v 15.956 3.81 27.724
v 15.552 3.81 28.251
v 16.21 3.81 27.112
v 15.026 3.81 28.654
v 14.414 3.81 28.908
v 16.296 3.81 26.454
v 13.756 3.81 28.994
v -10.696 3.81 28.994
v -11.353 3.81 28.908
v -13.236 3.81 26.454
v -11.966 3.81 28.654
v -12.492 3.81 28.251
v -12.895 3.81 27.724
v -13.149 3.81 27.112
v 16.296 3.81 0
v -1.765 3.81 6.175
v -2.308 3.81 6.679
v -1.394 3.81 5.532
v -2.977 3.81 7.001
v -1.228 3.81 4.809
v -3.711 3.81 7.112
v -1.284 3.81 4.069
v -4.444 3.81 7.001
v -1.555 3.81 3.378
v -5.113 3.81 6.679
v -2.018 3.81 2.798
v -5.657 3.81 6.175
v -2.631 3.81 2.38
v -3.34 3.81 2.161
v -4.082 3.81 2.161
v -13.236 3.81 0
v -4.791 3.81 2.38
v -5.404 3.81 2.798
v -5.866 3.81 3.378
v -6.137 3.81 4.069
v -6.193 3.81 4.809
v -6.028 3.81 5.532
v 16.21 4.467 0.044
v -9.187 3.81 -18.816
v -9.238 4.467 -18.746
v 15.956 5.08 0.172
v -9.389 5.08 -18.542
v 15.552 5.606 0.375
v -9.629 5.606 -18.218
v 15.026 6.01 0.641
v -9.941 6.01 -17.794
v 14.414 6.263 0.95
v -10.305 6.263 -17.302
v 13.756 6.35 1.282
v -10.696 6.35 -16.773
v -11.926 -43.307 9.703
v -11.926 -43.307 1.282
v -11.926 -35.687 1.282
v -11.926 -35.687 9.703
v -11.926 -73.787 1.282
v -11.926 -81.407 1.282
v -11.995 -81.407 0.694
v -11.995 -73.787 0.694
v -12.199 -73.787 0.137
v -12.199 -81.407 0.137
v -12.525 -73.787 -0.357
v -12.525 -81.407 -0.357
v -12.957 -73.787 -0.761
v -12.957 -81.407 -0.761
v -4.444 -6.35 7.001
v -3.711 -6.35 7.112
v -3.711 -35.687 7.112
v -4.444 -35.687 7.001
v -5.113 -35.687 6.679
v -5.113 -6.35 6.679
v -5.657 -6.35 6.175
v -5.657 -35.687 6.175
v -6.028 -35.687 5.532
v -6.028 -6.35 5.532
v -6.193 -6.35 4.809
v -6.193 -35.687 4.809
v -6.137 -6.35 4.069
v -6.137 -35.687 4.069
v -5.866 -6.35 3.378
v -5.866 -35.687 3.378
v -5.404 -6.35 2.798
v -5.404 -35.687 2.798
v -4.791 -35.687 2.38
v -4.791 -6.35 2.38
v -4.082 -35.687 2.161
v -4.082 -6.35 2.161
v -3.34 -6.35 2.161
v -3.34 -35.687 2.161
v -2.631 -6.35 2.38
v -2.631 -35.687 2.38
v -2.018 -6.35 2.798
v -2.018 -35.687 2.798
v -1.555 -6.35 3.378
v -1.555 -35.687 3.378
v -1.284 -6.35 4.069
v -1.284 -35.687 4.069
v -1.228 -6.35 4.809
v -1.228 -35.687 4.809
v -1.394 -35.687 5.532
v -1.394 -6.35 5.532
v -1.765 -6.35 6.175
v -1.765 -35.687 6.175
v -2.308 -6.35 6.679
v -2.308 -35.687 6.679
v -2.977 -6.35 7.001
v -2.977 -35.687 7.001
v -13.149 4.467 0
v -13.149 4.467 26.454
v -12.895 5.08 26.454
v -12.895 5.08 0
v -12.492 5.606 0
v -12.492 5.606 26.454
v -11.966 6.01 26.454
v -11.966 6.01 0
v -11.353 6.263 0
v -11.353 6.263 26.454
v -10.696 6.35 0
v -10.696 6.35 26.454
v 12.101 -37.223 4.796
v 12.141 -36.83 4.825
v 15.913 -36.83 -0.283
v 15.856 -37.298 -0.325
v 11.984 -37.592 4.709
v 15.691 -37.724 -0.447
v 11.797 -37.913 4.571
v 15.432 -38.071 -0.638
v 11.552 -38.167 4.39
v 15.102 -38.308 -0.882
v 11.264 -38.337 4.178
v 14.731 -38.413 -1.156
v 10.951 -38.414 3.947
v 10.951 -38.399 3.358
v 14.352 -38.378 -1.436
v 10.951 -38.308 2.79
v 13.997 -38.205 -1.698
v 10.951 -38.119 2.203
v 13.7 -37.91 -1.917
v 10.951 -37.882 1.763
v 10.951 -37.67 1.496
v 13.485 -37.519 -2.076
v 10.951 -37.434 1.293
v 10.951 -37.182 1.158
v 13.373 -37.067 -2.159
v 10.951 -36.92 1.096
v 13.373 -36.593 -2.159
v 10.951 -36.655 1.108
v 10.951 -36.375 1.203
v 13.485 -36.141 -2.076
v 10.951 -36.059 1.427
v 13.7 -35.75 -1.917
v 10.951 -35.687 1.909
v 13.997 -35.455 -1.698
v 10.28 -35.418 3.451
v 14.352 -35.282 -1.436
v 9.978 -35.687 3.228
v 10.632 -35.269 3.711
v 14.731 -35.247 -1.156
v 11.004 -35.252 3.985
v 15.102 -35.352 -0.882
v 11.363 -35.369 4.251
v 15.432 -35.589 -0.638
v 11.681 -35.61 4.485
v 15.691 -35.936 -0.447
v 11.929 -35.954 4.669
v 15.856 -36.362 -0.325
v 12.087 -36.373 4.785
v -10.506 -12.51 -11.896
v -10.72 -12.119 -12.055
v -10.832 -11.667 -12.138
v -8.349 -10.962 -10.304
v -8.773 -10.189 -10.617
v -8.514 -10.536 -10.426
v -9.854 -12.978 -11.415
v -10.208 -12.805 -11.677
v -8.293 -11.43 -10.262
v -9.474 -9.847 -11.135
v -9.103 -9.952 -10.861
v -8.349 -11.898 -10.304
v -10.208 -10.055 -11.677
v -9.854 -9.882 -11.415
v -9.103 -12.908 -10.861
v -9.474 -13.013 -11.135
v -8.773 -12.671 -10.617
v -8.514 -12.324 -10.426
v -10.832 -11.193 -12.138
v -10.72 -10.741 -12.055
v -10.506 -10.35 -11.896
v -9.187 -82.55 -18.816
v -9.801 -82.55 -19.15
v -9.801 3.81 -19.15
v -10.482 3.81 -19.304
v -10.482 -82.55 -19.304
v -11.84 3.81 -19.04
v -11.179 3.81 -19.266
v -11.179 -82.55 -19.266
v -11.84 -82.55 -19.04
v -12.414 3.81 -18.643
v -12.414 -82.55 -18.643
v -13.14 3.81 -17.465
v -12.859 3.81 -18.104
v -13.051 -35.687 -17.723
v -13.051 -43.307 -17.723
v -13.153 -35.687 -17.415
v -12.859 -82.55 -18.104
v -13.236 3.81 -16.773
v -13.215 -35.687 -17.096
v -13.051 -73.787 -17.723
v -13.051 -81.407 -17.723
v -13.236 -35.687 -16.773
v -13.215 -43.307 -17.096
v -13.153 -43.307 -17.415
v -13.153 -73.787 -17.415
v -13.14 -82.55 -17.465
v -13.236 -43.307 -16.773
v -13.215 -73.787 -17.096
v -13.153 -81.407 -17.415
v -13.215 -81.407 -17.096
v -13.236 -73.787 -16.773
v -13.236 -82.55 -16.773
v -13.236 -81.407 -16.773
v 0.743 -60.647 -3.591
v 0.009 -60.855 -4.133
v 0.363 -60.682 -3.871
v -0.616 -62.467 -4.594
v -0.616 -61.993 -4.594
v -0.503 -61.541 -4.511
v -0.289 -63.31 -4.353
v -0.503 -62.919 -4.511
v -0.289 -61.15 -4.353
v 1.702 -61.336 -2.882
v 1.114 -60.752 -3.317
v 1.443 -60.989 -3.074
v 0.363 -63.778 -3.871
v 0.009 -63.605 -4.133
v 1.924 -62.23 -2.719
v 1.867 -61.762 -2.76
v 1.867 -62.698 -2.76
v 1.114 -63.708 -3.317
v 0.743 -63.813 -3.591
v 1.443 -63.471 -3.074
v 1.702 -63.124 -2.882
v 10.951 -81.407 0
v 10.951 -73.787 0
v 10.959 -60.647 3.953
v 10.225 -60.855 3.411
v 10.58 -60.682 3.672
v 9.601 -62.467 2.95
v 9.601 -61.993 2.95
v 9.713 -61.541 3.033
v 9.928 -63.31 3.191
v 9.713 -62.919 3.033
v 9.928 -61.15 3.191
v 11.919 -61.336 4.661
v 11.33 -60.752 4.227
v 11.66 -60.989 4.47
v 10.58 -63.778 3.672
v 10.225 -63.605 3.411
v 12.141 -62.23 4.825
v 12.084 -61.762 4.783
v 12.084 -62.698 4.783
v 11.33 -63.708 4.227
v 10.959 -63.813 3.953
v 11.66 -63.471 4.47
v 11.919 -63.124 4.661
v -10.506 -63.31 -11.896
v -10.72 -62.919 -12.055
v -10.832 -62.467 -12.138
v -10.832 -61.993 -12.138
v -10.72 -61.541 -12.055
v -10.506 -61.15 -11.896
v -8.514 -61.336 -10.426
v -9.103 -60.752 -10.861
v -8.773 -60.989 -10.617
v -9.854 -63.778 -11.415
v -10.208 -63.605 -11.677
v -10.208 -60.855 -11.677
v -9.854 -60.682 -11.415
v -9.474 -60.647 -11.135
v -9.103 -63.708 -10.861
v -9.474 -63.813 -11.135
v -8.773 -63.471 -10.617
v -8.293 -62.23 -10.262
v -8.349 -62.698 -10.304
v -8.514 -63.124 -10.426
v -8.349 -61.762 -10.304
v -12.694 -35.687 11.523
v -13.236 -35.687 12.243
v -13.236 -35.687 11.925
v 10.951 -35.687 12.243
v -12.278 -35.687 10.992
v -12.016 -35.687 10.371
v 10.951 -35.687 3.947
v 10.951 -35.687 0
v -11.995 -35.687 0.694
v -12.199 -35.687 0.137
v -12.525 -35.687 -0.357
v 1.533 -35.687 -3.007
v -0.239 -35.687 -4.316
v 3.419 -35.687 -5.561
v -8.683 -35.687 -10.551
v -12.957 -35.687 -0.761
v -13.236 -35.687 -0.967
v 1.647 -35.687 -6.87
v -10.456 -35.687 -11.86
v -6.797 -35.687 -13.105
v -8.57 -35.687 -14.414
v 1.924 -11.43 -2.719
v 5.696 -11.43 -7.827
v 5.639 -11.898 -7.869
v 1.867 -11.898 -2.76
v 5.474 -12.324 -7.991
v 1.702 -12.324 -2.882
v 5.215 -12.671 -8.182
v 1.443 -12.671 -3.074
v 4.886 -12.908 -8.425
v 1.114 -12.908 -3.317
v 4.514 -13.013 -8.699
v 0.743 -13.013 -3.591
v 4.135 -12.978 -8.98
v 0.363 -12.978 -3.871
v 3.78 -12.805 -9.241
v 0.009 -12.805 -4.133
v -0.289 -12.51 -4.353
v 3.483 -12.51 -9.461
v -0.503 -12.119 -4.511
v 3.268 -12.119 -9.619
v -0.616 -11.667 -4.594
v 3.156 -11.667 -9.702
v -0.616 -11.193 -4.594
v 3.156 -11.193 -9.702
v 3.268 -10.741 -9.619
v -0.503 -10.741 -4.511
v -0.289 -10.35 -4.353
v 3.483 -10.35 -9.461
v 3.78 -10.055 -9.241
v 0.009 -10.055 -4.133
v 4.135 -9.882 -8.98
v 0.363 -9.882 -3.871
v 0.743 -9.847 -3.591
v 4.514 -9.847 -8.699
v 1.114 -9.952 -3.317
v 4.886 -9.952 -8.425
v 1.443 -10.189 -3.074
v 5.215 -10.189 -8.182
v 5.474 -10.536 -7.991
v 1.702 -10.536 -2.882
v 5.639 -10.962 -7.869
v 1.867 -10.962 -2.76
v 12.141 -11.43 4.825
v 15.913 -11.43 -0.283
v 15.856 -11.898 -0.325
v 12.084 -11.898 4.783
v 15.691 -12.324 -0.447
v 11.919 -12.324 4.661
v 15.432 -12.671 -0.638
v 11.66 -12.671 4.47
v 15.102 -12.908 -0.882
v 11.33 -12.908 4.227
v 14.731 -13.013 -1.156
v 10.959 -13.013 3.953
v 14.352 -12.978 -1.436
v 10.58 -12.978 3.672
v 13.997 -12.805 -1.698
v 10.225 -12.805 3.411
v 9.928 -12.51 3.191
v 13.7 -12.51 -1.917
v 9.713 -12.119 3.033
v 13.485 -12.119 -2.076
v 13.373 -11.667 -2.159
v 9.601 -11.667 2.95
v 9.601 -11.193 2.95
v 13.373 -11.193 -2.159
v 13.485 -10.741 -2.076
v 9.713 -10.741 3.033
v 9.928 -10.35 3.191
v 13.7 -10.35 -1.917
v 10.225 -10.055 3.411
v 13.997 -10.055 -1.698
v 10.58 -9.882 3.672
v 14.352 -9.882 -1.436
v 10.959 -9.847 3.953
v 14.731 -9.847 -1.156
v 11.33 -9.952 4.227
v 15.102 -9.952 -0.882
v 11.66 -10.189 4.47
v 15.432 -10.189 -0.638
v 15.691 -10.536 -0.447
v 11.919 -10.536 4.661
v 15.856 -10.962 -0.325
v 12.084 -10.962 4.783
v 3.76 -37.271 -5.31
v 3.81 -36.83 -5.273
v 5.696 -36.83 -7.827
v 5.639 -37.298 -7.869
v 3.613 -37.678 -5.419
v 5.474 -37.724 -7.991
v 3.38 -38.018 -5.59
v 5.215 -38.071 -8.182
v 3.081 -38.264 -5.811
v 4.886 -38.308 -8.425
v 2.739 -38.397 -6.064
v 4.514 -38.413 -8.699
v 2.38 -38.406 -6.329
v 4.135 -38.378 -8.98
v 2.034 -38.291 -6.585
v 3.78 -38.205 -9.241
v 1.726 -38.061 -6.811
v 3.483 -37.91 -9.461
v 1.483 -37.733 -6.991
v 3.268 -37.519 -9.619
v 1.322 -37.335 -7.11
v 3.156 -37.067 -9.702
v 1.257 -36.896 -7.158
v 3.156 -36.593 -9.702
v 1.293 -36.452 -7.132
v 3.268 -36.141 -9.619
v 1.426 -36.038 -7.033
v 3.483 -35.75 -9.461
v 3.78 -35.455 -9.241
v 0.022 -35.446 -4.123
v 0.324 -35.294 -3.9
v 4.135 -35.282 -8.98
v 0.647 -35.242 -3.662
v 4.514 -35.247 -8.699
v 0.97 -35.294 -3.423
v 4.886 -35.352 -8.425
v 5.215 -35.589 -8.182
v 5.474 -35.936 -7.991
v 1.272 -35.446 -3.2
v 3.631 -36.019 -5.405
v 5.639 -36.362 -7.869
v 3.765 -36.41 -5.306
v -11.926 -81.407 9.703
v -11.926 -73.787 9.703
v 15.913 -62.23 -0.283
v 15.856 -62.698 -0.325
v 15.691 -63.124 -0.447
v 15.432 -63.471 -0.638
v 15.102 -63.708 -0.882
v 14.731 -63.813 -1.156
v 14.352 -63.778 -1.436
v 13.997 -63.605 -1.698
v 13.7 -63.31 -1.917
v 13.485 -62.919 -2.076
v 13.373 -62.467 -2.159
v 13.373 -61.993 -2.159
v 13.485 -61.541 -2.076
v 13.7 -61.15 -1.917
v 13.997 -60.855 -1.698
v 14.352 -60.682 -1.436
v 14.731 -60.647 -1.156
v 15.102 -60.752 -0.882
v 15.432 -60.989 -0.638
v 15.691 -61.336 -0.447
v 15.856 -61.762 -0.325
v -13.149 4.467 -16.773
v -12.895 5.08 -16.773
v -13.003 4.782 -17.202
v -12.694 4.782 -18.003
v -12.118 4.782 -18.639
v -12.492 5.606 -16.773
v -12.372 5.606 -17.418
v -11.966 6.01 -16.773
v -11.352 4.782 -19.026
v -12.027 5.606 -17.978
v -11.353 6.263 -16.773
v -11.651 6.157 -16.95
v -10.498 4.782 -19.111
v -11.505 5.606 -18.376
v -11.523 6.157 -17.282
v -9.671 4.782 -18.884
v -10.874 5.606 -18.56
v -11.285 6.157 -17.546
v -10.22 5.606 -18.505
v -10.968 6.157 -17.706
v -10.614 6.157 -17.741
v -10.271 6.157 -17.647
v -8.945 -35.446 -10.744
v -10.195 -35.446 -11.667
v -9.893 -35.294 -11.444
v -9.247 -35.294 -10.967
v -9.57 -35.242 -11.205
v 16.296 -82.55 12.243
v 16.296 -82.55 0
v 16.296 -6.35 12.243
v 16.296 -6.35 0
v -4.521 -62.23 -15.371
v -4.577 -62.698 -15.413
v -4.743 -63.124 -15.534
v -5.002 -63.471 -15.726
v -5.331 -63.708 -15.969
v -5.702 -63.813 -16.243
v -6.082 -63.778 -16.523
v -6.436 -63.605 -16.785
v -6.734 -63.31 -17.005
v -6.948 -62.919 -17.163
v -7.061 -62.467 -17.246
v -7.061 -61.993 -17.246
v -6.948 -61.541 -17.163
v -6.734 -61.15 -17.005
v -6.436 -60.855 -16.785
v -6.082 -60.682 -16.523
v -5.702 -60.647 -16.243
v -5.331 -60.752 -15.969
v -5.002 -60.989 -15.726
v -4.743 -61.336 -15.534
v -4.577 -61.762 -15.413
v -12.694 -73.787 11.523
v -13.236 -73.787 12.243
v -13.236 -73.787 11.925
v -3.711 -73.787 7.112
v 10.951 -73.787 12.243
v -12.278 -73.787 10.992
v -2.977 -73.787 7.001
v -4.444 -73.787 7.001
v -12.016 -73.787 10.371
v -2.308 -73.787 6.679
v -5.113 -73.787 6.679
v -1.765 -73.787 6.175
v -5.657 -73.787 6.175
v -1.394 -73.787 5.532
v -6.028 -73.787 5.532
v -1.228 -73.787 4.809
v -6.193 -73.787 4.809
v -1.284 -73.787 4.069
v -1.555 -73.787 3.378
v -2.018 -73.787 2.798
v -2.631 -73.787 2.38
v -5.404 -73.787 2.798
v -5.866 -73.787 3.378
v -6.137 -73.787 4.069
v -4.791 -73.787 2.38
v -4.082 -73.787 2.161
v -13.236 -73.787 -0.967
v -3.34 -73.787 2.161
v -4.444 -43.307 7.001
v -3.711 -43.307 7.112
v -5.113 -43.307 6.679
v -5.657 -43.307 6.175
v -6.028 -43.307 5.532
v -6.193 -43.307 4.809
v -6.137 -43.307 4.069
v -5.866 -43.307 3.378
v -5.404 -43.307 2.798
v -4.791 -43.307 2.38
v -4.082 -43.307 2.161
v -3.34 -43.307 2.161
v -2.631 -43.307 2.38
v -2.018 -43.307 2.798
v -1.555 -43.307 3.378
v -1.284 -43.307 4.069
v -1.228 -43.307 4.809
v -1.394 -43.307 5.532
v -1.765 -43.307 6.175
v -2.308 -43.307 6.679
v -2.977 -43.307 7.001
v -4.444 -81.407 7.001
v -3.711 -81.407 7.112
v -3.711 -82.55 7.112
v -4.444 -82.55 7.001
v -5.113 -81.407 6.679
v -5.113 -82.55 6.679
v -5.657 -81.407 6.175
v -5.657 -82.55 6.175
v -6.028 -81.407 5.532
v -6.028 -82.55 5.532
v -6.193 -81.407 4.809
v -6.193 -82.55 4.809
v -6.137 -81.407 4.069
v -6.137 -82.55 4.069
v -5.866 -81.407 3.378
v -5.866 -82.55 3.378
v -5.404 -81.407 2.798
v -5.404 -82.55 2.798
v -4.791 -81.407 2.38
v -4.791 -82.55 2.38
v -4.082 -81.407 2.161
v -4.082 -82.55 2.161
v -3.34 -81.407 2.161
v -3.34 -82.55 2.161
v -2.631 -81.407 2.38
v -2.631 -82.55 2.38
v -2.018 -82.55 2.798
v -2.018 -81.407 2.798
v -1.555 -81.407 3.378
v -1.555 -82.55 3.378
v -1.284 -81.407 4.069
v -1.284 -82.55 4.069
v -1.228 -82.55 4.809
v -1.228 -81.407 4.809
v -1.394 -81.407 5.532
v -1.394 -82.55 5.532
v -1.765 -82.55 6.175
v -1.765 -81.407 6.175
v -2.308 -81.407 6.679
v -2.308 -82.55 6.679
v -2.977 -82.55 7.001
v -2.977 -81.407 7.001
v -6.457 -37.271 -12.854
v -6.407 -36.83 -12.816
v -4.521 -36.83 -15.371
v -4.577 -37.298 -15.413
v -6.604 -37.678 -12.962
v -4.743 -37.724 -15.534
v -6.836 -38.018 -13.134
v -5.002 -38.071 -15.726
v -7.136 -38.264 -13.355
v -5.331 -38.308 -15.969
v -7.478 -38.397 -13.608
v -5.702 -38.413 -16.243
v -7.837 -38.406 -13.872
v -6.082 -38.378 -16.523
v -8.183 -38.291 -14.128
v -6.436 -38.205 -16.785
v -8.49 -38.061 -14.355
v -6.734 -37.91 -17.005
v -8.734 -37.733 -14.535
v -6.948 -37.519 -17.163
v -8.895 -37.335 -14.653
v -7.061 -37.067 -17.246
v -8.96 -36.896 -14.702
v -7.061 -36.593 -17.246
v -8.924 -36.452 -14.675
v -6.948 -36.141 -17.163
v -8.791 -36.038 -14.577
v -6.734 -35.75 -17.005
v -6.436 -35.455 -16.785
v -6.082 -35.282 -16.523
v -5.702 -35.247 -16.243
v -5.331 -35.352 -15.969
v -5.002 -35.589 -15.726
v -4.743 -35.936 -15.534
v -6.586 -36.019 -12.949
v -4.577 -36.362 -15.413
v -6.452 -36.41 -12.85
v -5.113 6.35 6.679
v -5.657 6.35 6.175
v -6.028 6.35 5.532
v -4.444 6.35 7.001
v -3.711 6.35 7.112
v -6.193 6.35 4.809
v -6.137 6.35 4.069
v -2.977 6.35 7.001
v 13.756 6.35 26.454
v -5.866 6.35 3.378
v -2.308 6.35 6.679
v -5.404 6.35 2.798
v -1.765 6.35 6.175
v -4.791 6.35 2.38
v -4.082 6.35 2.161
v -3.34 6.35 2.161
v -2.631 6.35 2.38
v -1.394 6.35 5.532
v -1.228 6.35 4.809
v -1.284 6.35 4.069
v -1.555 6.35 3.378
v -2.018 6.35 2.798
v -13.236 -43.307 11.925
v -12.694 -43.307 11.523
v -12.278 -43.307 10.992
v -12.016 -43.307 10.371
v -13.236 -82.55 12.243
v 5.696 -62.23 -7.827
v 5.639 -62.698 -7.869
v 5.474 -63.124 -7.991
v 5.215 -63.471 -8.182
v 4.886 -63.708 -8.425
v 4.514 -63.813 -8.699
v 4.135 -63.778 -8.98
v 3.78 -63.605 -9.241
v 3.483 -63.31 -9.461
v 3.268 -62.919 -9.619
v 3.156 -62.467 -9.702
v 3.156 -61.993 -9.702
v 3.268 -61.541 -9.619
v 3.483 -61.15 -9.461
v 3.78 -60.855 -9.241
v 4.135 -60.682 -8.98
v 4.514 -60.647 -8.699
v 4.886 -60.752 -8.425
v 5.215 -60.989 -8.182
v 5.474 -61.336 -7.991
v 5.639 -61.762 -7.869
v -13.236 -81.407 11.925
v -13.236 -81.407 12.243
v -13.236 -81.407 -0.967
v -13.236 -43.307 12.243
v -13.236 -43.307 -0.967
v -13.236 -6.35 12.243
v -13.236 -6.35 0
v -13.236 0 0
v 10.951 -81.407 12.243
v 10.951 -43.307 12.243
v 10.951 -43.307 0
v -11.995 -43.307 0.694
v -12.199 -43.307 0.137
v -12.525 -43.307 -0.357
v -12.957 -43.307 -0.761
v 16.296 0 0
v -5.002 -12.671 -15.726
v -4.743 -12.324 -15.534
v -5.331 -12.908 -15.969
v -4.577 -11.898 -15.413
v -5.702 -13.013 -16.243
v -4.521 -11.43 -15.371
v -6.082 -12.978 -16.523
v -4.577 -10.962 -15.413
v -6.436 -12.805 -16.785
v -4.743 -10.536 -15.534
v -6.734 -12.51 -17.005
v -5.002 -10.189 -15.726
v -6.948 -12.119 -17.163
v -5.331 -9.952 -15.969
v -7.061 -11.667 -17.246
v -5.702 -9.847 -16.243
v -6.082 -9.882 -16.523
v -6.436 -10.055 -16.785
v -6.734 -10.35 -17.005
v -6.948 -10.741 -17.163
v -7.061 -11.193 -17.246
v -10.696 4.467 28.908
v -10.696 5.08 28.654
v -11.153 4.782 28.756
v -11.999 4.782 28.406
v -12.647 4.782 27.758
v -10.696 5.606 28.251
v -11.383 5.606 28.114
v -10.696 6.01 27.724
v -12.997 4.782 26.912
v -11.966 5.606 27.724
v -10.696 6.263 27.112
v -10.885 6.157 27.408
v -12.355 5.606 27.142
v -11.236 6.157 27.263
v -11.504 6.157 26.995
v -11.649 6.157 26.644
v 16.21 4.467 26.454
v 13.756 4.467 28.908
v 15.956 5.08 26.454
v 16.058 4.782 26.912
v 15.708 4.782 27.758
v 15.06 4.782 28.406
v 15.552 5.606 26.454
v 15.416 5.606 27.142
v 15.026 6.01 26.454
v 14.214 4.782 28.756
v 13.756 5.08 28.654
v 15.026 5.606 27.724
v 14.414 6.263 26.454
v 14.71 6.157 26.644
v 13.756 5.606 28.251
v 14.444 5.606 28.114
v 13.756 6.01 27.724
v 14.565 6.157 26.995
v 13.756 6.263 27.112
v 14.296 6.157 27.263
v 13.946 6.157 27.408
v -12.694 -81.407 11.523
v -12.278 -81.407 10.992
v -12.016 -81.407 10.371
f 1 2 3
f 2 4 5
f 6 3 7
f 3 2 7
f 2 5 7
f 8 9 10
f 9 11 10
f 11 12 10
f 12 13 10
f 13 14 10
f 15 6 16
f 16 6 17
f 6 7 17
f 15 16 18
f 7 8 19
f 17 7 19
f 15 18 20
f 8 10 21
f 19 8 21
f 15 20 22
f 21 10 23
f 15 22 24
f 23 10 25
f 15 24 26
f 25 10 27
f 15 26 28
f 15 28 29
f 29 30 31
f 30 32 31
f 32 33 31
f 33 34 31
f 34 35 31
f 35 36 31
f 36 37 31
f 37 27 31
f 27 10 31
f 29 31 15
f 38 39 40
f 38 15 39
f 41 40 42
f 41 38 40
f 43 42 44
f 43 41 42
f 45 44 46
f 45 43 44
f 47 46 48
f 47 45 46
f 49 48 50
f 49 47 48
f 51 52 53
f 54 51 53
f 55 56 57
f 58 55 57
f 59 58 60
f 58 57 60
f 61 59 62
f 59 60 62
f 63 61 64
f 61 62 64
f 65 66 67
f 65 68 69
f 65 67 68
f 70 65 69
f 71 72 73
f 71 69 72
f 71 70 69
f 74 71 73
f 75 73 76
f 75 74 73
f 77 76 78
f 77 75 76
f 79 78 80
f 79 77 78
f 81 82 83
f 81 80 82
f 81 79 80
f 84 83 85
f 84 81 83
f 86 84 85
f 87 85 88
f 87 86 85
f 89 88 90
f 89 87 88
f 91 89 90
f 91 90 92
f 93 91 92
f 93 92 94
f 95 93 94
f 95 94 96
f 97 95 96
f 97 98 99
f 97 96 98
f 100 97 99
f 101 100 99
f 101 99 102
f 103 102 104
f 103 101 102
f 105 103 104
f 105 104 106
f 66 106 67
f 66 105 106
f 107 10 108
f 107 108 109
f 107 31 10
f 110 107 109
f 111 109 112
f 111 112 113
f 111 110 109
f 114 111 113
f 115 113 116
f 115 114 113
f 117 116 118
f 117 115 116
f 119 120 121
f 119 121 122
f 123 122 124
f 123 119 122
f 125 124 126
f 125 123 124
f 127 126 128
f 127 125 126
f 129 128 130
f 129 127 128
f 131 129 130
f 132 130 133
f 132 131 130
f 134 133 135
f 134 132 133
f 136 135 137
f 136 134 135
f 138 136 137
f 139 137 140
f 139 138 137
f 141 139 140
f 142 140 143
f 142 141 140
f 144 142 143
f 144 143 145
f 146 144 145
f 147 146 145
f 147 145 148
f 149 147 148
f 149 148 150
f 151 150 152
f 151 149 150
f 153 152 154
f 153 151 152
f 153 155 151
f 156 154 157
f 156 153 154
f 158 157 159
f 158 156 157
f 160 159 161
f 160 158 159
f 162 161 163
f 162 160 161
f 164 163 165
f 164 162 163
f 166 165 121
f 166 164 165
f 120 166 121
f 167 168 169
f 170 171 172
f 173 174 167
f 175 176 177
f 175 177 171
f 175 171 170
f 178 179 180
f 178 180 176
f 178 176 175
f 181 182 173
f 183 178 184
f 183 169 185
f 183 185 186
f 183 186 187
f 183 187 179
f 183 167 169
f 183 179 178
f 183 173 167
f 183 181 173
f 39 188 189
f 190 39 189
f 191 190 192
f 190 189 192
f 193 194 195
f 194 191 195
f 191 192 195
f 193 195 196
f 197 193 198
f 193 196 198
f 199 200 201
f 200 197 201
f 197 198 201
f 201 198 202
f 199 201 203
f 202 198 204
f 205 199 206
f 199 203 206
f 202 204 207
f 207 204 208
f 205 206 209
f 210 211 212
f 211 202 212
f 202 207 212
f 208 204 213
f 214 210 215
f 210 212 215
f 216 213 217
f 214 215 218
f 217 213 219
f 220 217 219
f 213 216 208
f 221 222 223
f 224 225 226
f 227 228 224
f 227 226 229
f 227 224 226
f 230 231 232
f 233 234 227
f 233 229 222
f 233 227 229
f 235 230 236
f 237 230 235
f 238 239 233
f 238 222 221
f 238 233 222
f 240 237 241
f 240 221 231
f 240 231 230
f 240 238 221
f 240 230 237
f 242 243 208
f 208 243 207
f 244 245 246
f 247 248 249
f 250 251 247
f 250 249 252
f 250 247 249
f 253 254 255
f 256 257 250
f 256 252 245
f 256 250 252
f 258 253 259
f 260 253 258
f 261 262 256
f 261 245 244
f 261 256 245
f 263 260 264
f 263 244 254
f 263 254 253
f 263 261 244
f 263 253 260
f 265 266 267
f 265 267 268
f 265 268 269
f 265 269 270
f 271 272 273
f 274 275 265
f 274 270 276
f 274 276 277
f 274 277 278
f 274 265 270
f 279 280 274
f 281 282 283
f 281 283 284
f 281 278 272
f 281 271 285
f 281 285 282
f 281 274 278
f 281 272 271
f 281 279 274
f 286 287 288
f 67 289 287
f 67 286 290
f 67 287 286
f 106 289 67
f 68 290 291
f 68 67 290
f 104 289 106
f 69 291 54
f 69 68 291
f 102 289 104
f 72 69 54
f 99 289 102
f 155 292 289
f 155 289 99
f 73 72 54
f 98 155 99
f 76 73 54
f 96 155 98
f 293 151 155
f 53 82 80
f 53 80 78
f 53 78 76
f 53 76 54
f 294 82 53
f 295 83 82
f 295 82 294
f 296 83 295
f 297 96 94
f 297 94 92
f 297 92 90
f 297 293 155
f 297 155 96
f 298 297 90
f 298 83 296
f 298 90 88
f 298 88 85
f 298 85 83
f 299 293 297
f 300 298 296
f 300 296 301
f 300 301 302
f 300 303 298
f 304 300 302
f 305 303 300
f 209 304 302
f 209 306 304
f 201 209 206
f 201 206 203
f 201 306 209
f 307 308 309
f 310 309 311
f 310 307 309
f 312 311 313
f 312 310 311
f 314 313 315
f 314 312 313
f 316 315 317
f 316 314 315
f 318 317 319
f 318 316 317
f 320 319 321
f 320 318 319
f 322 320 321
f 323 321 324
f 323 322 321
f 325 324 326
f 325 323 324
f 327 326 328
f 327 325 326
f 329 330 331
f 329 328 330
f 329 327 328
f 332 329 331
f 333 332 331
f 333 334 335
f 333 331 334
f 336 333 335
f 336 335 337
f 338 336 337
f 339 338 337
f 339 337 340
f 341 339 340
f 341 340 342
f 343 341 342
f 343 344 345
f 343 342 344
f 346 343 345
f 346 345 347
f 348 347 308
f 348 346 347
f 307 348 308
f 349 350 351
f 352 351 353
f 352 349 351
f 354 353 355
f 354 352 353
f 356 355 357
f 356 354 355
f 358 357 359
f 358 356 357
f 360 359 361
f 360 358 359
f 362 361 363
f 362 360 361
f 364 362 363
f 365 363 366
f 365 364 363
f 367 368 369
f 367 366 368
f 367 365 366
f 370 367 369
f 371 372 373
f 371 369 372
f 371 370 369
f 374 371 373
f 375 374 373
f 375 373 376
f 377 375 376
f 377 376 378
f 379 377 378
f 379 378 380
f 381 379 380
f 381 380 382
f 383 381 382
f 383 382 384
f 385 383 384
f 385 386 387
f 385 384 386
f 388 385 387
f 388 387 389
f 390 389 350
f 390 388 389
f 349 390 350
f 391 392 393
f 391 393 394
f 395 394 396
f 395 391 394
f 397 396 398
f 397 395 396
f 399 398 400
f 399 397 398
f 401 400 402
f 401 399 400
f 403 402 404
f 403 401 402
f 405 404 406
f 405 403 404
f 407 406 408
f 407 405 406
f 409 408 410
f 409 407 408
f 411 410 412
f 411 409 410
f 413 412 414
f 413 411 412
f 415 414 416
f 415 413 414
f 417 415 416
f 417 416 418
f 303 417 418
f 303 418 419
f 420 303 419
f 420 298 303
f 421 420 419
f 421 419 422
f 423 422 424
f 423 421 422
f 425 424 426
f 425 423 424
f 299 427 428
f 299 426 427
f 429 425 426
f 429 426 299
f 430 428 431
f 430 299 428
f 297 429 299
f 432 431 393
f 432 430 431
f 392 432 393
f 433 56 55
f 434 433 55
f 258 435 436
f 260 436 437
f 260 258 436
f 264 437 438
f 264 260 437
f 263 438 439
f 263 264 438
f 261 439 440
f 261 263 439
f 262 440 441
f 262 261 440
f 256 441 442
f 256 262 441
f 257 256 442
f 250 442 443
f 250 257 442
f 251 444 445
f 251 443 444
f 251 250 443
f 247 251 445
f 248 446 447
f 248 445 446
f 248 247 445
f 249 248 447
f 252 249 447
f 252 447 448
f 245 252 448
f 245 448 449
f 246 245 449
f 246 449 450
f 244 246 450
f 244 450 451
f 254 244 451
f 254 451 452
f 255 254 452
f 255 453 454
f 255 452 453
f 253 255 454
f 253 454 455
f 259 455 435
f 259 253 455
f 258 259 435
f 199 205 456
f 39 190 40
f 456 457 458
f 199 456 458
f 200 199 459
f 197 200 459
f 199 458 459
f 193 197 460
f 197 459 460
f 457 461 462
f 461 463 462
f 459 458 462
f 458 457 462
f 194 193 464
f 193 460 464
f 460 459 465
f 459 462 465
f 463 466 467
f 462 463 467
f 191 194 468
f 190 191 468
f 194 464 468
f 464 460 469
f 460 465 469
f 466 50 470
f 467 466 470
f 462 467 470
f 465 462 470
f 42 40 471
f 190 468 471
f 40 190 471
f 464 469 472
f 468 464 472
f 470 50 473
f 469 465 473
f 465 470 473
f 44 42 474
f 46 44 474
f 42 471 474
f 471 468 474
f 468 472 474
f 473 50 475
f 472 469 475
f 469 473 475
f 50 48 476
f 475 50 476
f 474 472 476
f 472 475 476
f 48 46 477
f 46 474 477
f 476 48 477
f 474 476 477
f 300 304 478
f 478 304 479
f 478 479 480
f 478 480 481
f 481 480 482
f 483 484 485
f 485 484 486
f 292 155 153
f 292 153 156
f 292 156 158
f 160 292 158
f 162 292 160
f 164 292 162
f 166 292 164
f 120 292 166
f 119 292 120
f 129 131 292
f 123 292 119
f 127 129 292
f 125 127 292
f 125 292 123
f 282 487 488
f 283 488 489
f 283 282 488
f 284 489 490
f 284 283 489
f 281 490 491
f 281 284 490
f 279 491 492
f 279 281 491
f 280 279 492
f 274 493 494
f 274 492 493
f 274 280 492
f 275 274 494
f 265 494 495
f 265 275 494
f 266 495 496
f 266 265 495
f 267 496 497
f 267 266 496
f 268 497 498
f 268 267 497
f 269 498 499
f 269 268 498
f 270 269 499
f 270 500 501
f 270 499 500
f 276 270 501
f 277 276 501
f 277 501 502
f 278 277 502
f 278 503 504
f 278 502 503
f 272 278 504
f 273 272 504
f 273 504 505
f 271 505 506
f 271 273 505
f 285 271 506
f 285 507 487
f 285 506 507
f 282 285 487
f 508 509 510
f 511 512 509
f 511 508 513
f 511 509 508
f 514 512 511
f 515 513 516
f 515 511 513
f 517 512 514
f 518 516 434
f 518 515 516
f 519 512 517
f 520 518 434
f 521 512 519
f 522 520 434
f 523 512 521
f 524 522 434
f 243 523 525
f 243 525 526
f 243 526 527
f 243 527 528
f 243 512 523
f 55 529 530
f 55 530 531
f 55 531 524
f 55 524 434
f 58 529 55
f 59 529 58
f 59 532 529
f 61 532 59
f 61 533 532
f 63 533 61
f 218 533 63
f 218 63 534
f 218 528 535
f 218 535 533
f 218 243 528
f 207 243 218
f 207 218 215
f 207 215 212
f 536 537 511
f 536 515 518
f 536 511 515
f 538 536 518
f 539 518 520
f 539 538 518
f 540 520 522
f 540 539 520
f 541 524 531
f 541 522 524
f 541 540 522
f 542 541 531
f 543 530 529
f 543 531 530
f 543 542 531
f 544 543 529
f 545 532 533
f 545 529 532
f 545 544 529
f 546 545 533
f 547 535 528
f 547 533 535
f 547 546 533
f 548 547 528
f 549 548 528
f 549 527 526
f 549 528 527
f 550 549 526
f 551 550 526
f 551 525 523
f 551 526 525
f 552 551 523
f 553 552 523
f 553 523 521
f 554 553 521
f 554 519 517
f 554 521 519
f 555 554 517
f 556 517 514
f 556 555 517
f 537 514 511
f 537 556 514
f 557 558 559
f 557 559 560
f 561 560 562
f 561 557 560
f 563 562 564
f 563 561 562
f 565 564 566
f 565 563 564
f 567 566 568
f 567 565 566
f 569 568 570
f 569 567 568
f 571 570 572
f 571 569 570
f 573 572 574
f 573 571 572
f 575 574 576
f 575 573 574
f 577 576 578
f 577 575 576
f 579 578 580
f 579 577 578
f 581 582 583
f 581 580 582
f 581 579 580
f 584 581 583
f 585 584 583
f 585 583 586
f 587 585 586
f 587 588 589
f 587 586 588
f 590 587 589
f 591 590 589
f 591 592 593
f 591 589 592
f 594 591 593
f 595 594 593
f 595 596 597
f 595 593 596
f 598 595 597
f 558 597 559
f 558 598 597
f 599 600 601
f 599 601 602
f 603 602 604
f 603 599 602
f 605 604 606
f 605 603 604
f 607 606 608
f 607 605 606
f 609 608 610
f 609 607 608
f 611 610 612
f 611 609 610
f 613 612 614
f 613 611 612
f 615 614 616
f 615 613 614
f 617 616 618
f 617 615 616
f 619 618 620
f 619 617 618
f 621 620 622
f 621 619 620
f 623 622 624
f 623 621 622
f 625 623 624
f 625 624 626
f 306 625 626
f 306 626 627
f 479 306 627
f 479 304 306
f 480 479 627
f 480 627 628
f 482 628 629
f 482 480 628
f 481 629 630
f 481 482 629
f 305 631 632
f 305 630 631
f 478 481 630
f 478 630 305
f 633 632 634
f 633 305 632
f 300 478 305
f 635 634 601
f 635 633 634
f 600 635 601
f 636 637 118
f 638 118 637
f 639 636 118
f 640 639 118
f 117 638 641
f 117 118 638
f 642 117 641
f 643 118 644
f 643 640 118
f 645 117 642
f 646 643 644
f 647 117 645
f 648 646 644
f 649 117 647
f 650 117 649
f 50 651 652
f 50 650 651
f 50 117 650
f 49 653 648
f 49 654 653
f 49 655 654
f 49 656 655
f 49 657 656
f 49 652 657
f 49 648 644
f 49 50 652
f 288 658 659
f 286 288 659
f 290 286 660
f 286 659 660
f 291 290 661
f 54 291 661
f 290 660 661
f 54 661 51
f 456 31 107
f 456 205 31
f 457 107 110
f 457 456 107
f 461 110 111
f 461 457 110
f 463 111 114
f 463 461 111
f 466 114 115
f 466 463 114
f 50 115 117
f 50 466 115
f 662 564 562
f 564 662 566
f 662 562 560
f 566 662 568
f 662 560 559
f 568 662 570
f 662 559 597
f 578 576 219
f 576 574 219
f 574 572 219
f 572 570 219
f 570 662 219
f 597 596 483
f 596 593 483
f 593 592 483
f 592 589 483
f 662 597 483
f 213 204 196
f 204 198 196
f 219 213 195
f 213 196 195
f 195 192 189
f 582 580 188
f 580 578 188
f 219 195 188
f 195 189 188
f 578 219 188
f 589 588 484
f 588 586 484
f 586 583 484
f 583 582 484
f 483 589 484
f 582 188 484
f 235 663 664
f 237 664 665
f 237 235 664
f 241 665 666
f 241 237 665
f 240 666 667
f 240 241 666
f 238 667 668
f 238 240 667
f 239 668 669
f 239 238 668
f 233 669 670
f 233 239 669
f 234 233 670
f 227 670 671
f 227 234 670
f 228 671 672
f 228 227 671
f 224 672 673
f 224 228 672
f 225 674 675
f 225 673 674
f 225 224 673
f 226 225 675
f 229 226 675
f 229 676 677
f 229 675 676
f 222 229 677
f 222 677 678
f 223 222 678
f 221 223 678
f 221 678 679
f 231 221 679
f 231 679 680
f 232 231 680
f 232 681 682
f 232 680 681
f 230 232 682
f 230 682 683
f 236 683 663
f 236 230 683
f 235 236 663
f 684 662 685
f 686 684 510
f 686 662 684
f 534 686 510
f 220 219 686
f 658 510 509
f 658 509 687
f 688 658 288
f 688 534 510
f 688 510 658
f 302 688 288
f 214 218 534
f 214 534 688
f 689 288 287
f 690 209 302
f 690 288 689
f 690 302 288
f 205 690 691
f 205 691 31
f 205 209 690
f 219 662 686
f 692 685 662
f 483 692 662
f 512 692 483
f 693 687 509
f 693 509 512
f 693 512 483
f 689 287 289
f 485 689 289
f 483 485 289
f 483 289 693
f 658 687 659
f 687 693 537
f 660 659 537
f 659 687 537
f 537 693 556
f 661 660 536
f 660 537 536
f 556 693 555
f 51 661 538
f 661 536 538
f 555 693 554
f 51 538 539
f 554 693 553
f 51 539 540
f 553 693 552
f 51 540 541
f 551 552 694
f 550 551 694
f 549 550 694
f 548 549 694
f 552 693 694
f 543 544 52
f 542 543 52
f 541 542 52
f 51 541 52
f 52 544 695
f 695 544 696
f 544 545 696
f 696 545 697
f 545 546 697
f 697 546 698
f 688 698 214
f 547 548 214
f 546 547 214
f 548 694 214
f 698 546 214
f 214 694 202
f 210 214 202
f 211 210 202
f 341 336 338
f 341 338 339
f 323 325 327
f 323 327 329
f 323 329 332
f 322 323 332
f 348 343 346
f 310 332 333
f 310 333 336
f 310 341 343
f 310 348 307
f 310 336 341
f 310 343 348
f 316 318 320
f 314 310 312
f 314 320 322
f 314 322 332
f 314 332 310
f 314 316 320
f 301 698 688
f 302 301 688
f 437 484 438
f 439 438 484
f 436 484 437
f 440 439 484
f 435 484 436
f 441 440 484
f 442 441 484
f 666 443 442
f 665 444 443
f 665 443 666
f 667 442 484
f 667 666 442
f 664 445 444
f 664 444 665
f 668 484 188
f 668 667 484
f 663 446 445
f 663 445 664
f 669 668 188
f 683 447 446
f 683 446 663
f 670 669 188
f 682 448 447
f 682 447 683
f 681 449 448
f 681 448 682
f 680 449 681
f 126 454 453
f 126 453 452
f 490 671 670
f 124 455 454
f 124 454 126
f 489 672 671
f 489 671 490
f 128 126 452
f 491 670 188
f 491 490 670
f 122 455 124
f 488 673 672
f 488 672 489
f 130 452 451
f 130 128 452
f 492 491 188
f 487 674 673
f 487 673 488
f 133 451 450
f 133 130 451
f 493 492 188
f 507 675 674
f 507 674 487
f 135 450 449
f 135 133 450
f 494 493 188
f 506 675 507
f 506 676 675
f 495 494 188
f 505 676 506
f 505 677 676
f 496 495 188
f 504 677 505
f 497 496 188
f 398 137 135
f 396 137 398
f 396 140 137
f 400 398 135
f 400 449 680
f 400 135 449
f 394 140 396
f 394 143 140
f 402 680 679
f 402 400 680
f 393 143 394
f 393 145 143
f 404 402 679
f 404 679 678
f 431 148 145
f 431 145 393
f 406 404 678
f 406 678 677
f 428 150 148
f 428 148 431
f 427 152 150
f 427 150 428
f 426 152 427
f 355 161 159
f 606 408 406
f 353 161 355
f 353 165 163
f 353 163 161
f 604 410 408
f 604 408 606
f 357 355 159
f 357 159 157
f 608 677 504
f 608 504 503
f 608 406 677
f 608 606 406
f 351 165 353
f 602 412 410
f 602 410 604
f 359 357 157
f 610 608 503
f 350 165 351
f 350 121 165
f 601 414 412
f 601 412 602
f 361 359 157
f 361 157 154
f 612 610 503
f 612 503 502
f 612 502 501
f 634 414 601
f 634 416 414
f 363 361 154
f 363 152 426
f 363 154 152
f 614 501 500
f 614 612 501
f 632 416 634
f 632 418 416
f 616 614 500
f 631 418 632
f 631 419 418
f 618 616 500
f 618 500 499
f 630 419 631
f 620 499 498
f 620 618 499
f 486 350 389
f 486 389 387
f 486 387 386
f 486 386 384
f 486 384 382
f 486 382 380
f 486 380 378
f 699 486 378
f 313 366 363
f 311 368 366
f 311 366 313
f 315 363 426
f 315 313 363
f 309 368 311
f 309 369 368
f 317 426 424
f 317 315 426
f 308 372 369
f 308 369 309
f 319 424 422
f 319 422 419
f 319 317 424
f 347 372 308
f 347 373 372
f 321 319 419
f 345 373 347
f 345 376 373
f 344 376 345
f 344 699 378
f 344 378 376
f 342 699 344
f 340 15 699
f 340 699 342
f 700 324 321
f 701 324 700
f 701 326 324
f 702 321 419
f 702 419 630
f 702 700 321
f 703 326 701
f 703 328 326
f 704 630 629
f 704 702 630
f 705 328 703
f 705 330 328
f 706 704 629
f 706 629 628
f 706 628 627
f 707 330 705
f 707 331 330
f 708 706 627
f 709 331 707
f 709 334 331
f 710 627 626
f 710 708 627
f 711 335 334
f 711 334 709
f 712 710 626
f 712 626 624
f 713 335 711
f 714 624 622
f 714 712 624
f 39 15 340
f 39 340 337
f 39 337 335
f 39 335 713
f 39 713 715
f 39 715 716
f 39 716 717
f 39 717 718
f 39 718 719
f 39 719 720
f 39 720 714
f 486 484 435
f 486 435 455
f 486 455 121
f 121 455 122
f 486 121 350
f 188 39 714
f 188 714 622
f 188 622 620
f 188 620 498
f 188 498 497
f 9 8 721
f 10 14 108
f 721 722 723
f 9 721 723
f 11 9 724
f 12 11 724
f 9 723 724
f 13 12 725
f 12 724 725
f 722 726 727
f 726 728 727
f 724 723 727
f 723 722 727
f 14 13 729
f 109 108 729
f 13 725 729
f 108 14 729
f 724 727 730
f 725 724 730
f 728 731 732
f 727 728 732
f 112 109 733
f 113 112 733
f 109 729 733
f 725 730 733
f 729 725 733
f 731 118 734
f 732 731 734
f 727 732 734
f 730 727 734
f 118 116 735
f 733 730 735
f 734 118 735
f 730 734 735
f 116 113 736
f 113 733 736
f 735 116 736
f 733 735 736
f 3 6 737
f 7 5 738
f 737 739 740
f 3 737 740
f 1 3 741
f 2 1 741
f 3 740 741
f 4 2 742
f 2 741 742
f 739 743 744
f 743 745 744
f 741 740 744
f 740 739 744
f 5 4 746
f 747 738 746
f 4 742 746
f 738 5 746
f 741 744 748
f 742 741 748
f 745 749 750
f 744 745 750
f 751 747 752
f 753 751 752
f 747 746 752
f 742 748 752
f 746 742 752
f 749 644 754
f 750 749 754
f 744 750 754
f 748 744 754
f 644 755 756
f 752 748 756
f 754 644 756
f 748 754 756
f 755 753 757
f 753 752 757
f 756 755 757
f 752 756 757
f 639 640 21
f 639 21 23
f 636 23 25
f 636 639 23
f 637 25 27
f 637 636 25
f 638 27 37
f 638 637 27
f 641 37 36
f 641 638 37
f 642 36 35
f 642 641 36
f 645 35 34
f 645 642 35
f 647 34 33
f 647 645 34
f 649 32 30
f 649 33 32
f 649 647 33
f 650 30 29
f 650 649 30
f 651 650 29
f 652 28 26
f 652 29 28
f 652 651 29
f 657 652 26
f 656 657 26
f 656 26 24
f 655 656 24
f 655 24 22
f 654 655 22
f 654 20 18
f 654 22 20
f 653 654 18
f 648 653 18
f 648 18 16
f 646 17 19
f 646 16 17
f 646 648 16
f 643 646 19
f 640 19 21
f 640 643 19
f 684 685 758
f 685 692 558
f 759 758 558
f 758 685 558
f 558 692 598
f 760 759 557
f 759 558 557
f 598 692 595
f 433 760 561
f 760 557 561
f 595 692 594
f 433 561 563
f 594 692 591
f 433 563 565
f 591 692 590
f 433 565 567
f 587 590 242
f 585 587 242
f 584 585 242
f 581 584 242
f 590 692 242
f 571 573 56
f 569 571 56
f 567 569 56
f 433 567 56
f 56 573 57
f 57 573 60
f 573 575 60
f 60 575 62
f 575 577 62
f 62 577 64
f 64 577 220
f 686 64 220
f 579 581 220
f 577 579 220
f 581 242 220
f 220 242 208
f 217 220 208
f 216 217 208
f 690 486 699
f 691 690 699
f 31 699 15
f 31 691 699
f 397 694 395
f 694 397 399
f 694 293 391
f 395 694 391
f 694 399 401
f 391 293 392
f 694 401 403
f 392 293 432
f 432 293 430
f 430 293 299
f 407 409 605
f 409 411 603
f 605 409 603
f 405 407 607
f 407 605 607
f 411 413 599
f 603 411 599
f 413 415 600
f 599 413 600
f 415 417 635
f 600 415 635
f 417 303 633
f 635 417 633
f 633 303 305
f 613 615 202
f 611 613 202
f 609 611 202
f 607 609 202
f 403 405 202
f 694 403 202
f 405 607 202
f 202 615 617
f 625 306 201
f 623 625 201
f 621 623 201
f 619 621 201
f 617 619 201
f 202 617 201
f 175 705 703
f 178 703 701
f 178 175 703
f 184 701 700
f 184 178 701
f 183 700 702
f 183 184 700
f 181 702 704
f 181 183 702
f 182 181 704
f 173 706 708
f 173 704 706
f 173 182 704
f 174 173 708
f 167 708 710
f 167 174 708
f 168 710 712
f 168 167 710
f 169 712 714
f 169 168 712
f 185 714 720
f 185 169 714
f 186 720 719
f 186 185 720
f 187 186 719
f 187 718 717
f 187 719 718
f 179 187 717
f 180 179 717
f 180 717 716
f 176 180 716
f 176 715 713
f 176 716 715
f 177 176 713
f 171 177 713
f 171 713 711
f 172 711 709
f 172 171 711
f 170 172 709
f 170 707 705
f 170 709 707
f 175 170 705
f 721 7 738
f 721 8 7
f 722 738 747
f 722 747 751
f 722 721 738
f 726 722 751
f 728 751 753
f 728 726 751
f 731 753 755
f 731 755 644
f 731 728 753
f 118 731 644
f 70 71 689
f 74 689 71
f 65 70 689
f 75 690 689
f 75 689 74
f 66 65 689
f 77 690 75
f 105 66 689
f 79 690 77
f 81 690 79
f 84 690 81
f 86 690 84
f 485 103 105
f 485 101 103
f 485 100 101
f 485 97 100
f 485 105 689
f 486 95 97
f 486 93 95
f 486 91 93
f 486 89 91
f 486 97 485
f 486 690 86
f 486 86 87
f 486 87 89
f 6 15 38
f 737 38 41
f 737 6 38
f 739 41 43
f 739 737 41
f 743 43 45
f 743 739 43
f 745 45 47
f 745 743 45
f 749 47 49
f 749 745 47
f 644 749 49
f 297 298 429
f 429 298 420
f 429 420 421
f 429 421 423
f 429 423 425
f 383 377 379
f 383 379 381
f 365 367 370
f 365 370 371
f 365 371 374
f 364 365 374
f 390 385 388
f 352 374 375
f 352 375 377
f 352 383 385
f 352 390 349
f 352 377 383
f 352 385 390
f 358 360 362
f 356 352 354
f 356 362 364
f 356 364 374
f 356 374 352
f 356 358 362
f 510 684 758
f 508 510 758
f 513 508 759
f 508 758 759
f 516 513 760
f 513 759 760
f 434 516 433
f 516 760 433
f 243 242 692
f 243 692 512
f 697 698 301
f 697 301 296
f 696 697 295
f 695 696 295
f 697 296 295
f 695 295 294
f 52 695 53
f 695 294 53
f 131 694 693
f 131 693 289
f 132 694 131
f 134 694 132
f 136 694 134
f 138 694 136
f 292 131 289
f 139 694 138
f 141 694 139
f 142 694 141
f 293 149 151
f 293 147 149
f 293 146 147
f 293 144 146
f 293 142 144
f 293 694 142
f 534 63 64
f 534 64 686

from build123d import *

# Parameters (mm, degrees)
SKETCH1_W               = 29.532117275
SKETCH1_H               = 16.294493356
BOSS_EXTRUDE1_DEPTH     = 6.35
BOSS_EXTRUDE2_DEPTH     = 82.55
SKETCH2_W               = 29.532117275
SKETCH2_H               = 16.294493356
CUT_EXTRUDE1_DEPTH      = 3.175
SKETCH4_W               = 29.532117275
SKETCH4_H               = 12.7
BOSS_EXTRUDE3_DEPTH     = 3.175
SKETCH7_W               = 36.710026843
SKETCH7_H               = 7.62
CUT_EXTRUDE4_DEPTH      = 13.589
SKETCH8_W               = 36.710026843
SKETCH8_H               = 7.62
CUT_EXTRUDE5_DEPTH      = 13.589
SKETCH9_W               = 29.532117275
SKETCH9_H               = 76.2
SKETCH9_W_2             = 22.877365929
SKETCH9_H_2             = 7.62
BOSS_EXTRUDE5_DEPTH     = 12.2428
CUT_EXTRUDE6_DEPTH      = 95.918198917
CUT_EXTRUDE6_DEPTH_BACK = 95.918198917
SKETCH10_R              = 2.4892
FILLET2_R               = 2.54
FILLET3_R               = 2.54
CUT_EXTRUDE7_DEPTH      = 2.54
CUT_EXTRUDE7_DEPTH_BACK = 6.35
SKETCH11_R              = 1.5875
CUT_EXTRUDE8_DEPTH      = 93.343538462
CUT_EXTRUDE8_DEPTH_BACK = 93.343538462
SKETCH12_W              = 28.994493356
SKETCH12_H              = 0.635


with BuildPart() as part:
    # Sketch1 → Boss-Extrude1 (new body)
    with BuildSketch(Plane(origin=(0, 0, 0), x_dir=(1, 0, 0), z_dir=(0, 1, 0))):
        Polygon((16.296436439, 0), (-13.235680836, 21.805506644), (-13.235680836, 0), align=None)
        with Locations((1.530377802, -8.147246678)):
            Rectangle(SKETCH1_W, SKETCH1_H)
    extrude(amount=BOSS_EXTRUDE1_DEPTH)

    # Sketch1<3> → Boss-Extrude2 (add)
    with BuildSketch(Plane(origin=(0, 0, 0), x_dir=(1, 0, 0), z_dir=(0, 1, 0))):
        Polygon((16.296436439, 0), (-13.235680836, 21.805506644), (-13.235680836, 0), align=None)
    extrude(amount=-BOSS_EXTRUDE2_DEPTH)

    # Sketch2 → Cut-Extrude1 (cut)
    with BuildSketch(Plane(origin=(0, 0, 0), x_dir=(-1, 0, 0), z_dir=(0, -1, 0))):
        with Locations((-1.530377802, -8.147246678)):
            Rectangle(SKETCH2_W, SKETCH2_H)
    extrude(amount=-CUT_EXTRUDE1_DEPTH, mode=Mode.SUBTRACT)

    # Sketch4 → Boss-Extrude3 (add)
    with BuildSketch(Plane(origin=(0, 6.35, 0), x_dir=(1, 0, 0), z_dir=(0, 1, 0))):
        with Locations((1.530377802, -22.644493356)):
            Rectangle(SKETCH4_W, SKETCH4_H)
    extrude(amount=-BOSS_EXTRUDE3_DEPTH)

    # Sketch7 → Cut-Extrude4 (cut)
    with BuildSketch(Plane(origin=(3.863909533, 0, -5.233055638), x_dir=(-0.804470053980136, 0, -0.5939932089251503), z_dir=(0.5939932089251503, 0, -0.804470053980136))):
        with Locations((5.24501832, -77.597)):
            Rectangle(SKETCH7_W, SKETCH7_H)
    extrude(amount=-CUT_EXTRUDE4_DEPTH, mode=Mode.SUBTRACT)

    # Sketch8 → Cut-Extrude5 (cut)
    with BuildSketch(Plane(origin=(3.863909533, 0, -5.233055638), x_dir=(-0.804470053980136, 0, -0.5939932089251503), z_dir=(0.5939932089251503, 0, -0.804470053980136))):
        with Locations((5.24501832, -39.497)):
            Rectangle(SKETCH8_W, SKETCH8_H)
    extrude(amount=-CUT_EXTRUDE5_DEPTH, mode=Mode.SUBTRACT)

    # Sketch9 → Boss-Extrude5 (add)
    with BuildSketch(Plane.XY):
        with Locations((1.530377802, -44.45)):
            Rectangle(SKETCH9_W, SKETCH9_H)
        with Locations((-0.487425481, -77.597)):
            Rectangle(SKETCH9_W_2, SKETCH9_H_2, mode=Mode.SUBTRACT)
        with Locations((-0.487425481, -39.497)):
            Rectangle(SKETCH9_W_2, SKETCH9_H_2, mode=Mode.SUBTRACT)
    extrude(amount=BOSS_EXTRUDE5_DEPTH)

    # Sketch10 → Cut-Extrude6 (cut, two sides: drawn at the far end of the back side and taken through both)
    with BuildSketch(Plane(origin=(0, -82.55, 0), x_dir=(-1, 0, 0), z_dir=(0, -1, 0)).offset(-CUT_EXTRUDE6_DEPTH_BACK)):
        with Locations(Location((3.710680836, -4.6228, 0), (0, 0, 270))):
            Circle(SKETCH10_R)
    extrude(amount=CUT_EXTRUDE6_DEPTH + CUT_EXTRUDE6_DEPTH_BACK, mode=Mode.SUBTRACT)

    # Fillet2
    # the kernel refuses this fillet: 2.54 mm, written as the material it takes off along each edge
    with BuildSketch(Plane(origin=(-13.235680836, -95.13201822, -21.805506644), x_dir=(0.8044700539801357, 0, 0.5939932089251506), z_dir=(0, 1, 0))) as fillet2_piece_1:
        with BuildLine():
            CenterArc((FILLET2_R * 1.98142019214, -FILLET2_R), FILLET2_R, 90, 126.440893479)
            Line((FILLET2_R * 1.17695013816, -FILLET2_R * 1.59399320893), (0, 0))
            Line((0, 0), (FILLET2_R * 1.98142019214, 0))
        make_face()
    extrude(amount=114.06403644, mode=Mode.SUBTRACT)
    with BuildSketch(Plane(origin=(-11.926108446, -81.407, 0), x_dir=(-0.8044700539801358, 0, -0.5939932089251506), z_dir=(0, 1, 0))) as fillet2_piece_2:
        with BuildLine():
            CenterArc((FILLET2_R * 0.504688507753, FILLET2_R), FILLET2_R, 216.440893479, 53.559106521)
            Line((-FILLET2_R * 0.299781546228, FILLET2_R * 0.406006791075), (0, 0))
            Line((0, 0), (FILLET2_R * 0.504688507753, 0))
        make_face()
    extrude(amount=7.62, mode=Mode.SUBTRACT)
    with BuildSketch(Plane(origin=(-11.926108446, -81.407, 12.2428), x_dir=(-1, 0, 0), z_dir=(0, 1, 0)), Plane(origin=(-11.926108446, -43.307, 12.2428), x_dir=(-1, 0, 0), z_dir=(0, 1, 0))) as fillet2_piece_3:
        with BuildLine():
            CenterArc((FILLET2_R, -FILLET2_R), FILLET2_R, 90, 90)
            Line((0, -FILLET2_R), (0, 0))
            Line((0, 0), (FILLET2_R, 0))
        make_face()
    extrude(amount=7.62, mode=Mode.SUBTRACT)
    with BuildSketch(Plane(origin=(-11.926108446, -35.687, 0), x_dir=(-0.8044700539801356, 0, -0.5939932089251507), z_dir=(0, -1, 0))) as fillet2_piece_4:
        with BuildLine():
            CenterArc((FILLET2_R * 0.504688507753, -FILLET2_R), FILLET2_R, 90, 53.559106521)
            Line((-FILLET2_R * 0.299781546228, -FILLET2_R * 0.406006791075), (0, 0))
            Line((0, 0), (FILLET2_R * 0.504688507753, 0))
        make_face()
    extrude(amount=7.62, mode=Mode.SUBTRACT)
    with BuildSketch(Plane(origin=(-13.235680836, 12.7, 28.994493356), x_dir=(0, 0, -1), z_dir=(0, -1, 0))) as fillet2_piece_5:
        with BuildLine():
            CenterArc((FILLET2_R, FILLET2_R), FILLET2_R, 180, 90)
            Line((0, FILLET2_R), (0, 0))
            Line((0, 0), (FILLET2_R, 0))
        make_face()
    extrude(amount=15.875, mode=Mode.SUBTRACT)
    with BuildSketch(Plane(origin=(16.296436439, 12.7, 28.994493356), x_dir=(0, 0, -1), z_dir=(0, -1, 0))) as fillet2_piece_6:
        with BuildLine():
            CenterArc((FILLET2_R, -FILLET2_R), FILLET2_R, 90, 90)
            Line((0, -FILLET2_R), (0, 0))
            Line((0, 0), (FILLET2_R, 0))
        make_face()
    extrude(amount=15.875, mode=Mode.SUBTRACT)

    # Fillet3
    fillet3_edges = [part.edges().sort_by_distance(p)[0] for p in [
        (-13.235680836, 6.35, 4.840897),
        (1.530377801, 6.35, 28.994493356),
        (16.296436439, 6.35, 13.227246678),
        (15.552487663, 6.35, 28.25054458),
        (-12.491732061, 6.35, 28.25054458),
        (-11.840100649, 6.35, -19.04027588),
        (3.554749177, 6.35, -9.408026646),
    ]]
    fillet(fillet3_edges, radius=FILLET3_R)

    # Sketch11 → Cut-Extrude7 (cut, two sides: drawn at the far end of the back side and taken through both)
    with BuildSketch(Plane(origin=(5.749837972, 0, -7.787248059), x_dir=(-0.8044700539801359, 0, -0.5939932089251502), z_dir=(0.5939932089251502, 0, -0.8044700539801359)).offset(-CUT_EXTRUDE7_DEPTH_BACK)):
        with Locations(Location((-11.04569204, -62.23, 0), (0, 0, 180))):
            Circle(SKETCH11_R)
        with Locations(Location((1.65430796, -62.23, 0), (0, 0, 180))):
            Circle(SKETCH11_R)
        with Locations(Location((14.35430796, -62.23, 0), (0, 0, 180))):
            Circle(SKETCH11_R)
        with Locations(Location((-11.04569204, -36.83, 0), (0, 0, 180))):
            Circle(SKETCH11_R)
        with Locations(Location((1.65430796, -36.83, 0), (0, 0, 180))):
            Circle(SKETCH11_R)
        with Locations(Location((14.35430796, -36.83, 0), (0, 0, 180))):
            Circle(SKETCH11_R)
        with Locations(Location((-11.04569204, -11.43, 0), (0, 0, 180))):
            Circle(SKETCH11_R)
        with Locations(Location((1.65430796, -11.43, 0), (0, 0, 180))):
            Circle(SKETCH11_R)
        with Locations(Location((14.35430796, -11.43, 0), (0, 0, 180))):
            Circle(SKETCH11_R)
    extrude(amount=CUT_EXTRUDE7_DEPTH + CUT_EXTRUDE7_DEPTH_BACK, mode=Mode.SUBTRACT)

    # Sketch12 → Cut-Extrude8 (cut, two sides: drawn at the far end of the back side and taken through both)
    with BuildSketch(Plane(origin=(16.296436439, 0, 0), x_dir=(0, 0, -1), z_dir=(1, 0, 0)).offset(-CUT_EXTRUDE8_DEPTH_BACK)):
        with Locations((-14.497246678, 3.4925)):
            Rectangle(SKETCH12_W, SKETCH12_H)
    extrude(amount=CUT_EXTRUDE8_DEPTH + CUT_EXTRUDE8_DEPTH_BACK, mode=Mode.SUBTRACT)


solid = part.part
